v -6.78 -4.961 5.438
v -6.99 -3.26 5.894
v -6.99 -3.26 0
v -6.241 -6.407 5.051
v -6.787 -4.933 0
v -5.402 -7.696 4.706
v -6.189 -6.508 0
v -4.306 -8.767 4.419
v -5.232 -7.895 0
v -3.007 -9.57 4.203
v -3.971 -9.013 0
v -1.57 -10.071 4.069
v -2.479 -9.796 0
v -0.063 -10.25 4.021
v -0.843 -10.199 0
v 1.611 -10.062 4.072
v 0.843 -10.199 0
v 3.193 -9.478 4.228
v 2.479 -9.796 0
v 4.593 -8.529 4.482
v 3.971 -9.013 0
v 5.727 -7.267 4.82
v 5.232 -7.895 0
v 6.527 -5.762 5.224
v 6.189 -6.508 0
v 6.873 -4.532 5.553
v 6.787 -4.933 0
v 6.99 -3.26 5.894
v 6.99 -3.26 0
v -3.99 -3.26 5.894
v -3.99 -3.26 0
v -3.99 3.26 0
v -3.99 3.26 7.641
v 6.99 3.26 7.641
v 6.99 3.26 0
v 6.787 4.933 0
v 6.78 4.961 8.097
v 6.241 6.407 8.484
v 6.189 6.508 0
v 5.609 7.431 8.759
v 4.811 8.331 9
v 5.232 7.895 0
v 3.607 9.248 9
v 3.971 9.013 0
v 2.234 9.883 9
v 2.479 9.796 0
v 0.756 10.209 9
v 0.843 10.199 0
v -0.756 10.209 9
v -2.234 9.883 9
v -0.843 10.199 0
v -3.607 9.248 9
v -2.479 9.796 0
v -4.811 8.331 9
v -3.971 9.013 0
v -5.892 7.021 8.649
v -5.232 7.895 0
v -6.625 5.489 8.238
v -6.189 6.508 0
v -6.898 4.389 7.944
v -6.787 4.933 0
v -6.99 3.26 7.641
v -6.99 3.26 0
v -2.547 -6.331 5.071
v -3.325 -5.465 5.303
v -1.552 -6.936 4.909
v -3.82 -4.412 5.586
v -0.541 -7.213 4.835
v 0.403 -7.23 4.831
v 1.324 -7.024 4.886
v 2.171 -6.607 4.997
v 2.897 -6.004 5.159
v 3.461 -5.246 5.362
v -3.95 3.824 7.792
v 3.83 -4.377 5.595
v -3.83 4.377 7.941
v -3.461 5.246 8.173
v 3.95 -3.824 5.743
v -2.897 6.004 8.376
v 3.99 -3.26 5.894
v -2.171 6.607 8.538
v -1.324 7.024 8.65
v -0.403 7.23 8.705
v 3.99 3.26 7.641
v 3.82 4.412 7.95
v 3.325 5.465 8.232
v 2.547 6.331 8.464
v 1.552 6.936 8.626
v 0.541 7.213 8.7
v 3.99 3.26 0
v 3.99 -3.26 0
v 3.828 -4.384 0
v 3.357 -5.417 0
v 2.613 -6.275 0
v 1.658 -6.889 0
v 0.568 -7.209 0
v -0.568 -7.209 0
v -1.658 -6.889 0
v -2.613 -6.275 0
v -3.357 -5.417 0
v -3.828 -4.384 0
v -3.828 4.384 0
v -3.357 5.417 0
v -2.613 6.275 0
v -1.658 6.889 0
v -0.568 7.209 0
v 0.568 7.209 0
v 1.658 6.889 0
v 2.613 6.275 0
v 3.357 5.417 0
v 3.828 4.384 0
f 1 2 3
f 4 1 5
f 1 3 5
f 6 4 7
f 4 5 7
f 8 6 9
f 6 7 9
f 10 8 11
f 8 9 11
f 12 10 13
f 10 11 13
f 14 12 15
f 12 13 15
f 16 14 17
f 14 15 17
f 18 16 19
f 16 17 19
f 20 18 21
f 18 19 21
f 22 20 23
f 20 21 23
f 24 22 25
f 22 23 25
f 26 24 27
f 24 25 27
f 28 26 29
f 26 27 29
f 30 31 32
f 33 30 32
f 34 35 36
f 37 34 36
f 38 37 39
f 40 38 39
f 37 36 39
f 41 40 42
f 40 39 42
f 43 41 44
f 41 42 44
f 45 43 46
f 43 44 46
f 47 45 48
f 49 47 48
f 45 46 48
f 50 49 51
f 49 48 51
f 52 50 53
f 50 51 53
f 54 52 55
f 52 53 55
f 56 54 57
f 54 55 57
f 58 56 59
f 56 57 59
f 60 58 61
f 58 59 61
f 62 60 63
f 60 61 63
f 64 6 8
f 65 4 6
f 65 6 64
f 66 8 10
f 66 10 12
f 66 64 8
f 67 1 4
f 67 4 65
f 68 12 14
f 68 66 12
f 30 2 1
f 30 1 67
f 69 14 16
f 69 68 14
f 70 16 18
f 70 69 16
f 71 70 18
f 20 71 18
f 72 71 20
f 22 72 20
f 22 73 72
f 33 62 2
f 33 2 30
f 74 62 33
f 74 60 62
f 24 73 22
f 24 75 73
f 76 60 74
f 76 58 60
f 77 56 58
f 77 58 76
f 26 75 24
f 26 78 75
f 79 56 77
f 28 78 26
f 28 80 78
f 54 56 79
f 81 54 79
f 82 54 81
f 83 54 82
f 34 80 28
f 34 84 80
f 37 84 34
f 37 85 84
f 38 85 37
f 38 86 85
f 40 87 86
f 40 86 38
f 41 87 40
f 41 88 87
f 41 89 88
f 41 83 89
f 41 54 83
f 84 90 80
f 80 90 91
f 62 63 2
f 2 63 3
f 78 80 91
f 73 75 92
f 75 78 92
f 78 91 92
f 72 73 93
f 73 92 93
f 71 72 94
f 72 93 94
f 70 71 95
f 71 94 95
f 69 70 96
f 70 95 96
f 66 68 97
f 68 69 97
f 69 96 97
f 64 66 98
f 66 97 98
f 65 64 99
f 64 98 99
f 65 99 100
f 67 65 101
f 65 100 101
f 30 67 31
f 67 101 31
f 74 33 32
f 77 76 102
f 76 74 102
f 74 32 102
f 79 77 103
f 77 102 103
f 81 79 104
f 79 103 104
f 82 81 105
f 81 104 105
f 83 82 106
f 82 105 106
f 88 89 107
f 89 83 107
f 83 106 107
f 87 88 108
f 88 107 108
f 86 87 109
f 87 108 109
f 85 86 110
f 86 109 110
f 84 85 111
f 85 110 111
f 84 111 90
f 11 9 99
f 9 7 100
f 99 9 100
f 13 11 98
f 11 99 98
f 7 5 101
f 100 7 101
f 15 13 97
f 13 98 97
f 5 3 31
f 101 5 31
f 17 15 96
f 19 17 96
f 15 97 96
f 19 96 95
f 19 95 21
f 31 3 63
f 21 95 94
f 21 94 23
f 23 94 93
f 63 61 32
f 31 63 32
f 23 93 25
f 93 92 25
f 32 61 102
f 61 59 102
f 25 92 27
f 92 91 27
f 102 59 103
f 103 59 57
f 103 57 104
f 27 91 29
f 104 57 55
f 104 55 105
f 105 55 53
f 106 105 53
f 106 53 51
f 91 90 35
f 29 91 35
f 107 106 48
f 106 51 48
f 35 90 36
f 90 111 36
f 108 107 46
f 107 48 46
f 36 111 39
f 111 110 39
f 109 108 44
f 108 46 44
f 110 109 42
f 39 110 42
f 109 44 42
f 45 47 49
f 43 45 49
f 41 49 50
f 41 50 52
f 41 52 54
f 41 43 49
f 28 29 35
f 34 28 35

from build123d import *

# Parameters (mm, degrees)
F1_DEPTH = 9
F5_W     = 42.8709182888
F5_H     = 32.7420830727
F6_DEPTH = 13


with BuildPart() as f1:
    # F0 (on Top) → F1 (new body)
    with BuildSketch(Plane.XY):
        with BuildLine():
            ThreePointArc((-6.9900002831, -3.26), (0, -10.2500002831), (6.9900002831, -3.26))
            Line((6.9900002831, -3.26), (6.9900002831, 0))
            Line((6.9900002831, 0), (6.9900002831, 3.26))
            ThreePointArc((6.9900002831, 3.26), (0, 10.2500002831), (-6.9900002831, 3.26))
            Line((-6.9900002831, 3.26), (-6.9900002831, 0))
            Line((-6.9900002831, 0), (-6.9900002831, -3.26))
        make_face()
        with BuildLine():
            ThreePointArc((-3.99, 3.26), (0, 7.25), (3.99, 3.26))
            Line((3.99, 3.26), (3.99, 0))
            Line((3.99, 0), (3.99, -3.26))
            ThreePointArc((3.99, -3.26), (0, -7.25), (-3.99, -3.26))
            Line((-3.99, -3.26), (-3.99, 0))
            Line((-3.99, 0), (-3.99, 3.26))
        make_face(mode=Mode.SUBTRACT)
    extrude(amount=F1_DEPTH)

    # F5 (on offset) → F6 (cut)
    with BuildSketch(Plane(origin=(0, -5.0565690429, 18.8713725799), x_dir=(1, 0, 0), z_dir=(0, -0.2588190451, 0.9659258263))):
        with Locations((-1.5699611977, 4.9039889127)):
            Rectangle(F5_W, F5_H)
    extrude(amount=-F6_DEPTH, mode=Mode.SUBTRACT)


solid = f1.part
